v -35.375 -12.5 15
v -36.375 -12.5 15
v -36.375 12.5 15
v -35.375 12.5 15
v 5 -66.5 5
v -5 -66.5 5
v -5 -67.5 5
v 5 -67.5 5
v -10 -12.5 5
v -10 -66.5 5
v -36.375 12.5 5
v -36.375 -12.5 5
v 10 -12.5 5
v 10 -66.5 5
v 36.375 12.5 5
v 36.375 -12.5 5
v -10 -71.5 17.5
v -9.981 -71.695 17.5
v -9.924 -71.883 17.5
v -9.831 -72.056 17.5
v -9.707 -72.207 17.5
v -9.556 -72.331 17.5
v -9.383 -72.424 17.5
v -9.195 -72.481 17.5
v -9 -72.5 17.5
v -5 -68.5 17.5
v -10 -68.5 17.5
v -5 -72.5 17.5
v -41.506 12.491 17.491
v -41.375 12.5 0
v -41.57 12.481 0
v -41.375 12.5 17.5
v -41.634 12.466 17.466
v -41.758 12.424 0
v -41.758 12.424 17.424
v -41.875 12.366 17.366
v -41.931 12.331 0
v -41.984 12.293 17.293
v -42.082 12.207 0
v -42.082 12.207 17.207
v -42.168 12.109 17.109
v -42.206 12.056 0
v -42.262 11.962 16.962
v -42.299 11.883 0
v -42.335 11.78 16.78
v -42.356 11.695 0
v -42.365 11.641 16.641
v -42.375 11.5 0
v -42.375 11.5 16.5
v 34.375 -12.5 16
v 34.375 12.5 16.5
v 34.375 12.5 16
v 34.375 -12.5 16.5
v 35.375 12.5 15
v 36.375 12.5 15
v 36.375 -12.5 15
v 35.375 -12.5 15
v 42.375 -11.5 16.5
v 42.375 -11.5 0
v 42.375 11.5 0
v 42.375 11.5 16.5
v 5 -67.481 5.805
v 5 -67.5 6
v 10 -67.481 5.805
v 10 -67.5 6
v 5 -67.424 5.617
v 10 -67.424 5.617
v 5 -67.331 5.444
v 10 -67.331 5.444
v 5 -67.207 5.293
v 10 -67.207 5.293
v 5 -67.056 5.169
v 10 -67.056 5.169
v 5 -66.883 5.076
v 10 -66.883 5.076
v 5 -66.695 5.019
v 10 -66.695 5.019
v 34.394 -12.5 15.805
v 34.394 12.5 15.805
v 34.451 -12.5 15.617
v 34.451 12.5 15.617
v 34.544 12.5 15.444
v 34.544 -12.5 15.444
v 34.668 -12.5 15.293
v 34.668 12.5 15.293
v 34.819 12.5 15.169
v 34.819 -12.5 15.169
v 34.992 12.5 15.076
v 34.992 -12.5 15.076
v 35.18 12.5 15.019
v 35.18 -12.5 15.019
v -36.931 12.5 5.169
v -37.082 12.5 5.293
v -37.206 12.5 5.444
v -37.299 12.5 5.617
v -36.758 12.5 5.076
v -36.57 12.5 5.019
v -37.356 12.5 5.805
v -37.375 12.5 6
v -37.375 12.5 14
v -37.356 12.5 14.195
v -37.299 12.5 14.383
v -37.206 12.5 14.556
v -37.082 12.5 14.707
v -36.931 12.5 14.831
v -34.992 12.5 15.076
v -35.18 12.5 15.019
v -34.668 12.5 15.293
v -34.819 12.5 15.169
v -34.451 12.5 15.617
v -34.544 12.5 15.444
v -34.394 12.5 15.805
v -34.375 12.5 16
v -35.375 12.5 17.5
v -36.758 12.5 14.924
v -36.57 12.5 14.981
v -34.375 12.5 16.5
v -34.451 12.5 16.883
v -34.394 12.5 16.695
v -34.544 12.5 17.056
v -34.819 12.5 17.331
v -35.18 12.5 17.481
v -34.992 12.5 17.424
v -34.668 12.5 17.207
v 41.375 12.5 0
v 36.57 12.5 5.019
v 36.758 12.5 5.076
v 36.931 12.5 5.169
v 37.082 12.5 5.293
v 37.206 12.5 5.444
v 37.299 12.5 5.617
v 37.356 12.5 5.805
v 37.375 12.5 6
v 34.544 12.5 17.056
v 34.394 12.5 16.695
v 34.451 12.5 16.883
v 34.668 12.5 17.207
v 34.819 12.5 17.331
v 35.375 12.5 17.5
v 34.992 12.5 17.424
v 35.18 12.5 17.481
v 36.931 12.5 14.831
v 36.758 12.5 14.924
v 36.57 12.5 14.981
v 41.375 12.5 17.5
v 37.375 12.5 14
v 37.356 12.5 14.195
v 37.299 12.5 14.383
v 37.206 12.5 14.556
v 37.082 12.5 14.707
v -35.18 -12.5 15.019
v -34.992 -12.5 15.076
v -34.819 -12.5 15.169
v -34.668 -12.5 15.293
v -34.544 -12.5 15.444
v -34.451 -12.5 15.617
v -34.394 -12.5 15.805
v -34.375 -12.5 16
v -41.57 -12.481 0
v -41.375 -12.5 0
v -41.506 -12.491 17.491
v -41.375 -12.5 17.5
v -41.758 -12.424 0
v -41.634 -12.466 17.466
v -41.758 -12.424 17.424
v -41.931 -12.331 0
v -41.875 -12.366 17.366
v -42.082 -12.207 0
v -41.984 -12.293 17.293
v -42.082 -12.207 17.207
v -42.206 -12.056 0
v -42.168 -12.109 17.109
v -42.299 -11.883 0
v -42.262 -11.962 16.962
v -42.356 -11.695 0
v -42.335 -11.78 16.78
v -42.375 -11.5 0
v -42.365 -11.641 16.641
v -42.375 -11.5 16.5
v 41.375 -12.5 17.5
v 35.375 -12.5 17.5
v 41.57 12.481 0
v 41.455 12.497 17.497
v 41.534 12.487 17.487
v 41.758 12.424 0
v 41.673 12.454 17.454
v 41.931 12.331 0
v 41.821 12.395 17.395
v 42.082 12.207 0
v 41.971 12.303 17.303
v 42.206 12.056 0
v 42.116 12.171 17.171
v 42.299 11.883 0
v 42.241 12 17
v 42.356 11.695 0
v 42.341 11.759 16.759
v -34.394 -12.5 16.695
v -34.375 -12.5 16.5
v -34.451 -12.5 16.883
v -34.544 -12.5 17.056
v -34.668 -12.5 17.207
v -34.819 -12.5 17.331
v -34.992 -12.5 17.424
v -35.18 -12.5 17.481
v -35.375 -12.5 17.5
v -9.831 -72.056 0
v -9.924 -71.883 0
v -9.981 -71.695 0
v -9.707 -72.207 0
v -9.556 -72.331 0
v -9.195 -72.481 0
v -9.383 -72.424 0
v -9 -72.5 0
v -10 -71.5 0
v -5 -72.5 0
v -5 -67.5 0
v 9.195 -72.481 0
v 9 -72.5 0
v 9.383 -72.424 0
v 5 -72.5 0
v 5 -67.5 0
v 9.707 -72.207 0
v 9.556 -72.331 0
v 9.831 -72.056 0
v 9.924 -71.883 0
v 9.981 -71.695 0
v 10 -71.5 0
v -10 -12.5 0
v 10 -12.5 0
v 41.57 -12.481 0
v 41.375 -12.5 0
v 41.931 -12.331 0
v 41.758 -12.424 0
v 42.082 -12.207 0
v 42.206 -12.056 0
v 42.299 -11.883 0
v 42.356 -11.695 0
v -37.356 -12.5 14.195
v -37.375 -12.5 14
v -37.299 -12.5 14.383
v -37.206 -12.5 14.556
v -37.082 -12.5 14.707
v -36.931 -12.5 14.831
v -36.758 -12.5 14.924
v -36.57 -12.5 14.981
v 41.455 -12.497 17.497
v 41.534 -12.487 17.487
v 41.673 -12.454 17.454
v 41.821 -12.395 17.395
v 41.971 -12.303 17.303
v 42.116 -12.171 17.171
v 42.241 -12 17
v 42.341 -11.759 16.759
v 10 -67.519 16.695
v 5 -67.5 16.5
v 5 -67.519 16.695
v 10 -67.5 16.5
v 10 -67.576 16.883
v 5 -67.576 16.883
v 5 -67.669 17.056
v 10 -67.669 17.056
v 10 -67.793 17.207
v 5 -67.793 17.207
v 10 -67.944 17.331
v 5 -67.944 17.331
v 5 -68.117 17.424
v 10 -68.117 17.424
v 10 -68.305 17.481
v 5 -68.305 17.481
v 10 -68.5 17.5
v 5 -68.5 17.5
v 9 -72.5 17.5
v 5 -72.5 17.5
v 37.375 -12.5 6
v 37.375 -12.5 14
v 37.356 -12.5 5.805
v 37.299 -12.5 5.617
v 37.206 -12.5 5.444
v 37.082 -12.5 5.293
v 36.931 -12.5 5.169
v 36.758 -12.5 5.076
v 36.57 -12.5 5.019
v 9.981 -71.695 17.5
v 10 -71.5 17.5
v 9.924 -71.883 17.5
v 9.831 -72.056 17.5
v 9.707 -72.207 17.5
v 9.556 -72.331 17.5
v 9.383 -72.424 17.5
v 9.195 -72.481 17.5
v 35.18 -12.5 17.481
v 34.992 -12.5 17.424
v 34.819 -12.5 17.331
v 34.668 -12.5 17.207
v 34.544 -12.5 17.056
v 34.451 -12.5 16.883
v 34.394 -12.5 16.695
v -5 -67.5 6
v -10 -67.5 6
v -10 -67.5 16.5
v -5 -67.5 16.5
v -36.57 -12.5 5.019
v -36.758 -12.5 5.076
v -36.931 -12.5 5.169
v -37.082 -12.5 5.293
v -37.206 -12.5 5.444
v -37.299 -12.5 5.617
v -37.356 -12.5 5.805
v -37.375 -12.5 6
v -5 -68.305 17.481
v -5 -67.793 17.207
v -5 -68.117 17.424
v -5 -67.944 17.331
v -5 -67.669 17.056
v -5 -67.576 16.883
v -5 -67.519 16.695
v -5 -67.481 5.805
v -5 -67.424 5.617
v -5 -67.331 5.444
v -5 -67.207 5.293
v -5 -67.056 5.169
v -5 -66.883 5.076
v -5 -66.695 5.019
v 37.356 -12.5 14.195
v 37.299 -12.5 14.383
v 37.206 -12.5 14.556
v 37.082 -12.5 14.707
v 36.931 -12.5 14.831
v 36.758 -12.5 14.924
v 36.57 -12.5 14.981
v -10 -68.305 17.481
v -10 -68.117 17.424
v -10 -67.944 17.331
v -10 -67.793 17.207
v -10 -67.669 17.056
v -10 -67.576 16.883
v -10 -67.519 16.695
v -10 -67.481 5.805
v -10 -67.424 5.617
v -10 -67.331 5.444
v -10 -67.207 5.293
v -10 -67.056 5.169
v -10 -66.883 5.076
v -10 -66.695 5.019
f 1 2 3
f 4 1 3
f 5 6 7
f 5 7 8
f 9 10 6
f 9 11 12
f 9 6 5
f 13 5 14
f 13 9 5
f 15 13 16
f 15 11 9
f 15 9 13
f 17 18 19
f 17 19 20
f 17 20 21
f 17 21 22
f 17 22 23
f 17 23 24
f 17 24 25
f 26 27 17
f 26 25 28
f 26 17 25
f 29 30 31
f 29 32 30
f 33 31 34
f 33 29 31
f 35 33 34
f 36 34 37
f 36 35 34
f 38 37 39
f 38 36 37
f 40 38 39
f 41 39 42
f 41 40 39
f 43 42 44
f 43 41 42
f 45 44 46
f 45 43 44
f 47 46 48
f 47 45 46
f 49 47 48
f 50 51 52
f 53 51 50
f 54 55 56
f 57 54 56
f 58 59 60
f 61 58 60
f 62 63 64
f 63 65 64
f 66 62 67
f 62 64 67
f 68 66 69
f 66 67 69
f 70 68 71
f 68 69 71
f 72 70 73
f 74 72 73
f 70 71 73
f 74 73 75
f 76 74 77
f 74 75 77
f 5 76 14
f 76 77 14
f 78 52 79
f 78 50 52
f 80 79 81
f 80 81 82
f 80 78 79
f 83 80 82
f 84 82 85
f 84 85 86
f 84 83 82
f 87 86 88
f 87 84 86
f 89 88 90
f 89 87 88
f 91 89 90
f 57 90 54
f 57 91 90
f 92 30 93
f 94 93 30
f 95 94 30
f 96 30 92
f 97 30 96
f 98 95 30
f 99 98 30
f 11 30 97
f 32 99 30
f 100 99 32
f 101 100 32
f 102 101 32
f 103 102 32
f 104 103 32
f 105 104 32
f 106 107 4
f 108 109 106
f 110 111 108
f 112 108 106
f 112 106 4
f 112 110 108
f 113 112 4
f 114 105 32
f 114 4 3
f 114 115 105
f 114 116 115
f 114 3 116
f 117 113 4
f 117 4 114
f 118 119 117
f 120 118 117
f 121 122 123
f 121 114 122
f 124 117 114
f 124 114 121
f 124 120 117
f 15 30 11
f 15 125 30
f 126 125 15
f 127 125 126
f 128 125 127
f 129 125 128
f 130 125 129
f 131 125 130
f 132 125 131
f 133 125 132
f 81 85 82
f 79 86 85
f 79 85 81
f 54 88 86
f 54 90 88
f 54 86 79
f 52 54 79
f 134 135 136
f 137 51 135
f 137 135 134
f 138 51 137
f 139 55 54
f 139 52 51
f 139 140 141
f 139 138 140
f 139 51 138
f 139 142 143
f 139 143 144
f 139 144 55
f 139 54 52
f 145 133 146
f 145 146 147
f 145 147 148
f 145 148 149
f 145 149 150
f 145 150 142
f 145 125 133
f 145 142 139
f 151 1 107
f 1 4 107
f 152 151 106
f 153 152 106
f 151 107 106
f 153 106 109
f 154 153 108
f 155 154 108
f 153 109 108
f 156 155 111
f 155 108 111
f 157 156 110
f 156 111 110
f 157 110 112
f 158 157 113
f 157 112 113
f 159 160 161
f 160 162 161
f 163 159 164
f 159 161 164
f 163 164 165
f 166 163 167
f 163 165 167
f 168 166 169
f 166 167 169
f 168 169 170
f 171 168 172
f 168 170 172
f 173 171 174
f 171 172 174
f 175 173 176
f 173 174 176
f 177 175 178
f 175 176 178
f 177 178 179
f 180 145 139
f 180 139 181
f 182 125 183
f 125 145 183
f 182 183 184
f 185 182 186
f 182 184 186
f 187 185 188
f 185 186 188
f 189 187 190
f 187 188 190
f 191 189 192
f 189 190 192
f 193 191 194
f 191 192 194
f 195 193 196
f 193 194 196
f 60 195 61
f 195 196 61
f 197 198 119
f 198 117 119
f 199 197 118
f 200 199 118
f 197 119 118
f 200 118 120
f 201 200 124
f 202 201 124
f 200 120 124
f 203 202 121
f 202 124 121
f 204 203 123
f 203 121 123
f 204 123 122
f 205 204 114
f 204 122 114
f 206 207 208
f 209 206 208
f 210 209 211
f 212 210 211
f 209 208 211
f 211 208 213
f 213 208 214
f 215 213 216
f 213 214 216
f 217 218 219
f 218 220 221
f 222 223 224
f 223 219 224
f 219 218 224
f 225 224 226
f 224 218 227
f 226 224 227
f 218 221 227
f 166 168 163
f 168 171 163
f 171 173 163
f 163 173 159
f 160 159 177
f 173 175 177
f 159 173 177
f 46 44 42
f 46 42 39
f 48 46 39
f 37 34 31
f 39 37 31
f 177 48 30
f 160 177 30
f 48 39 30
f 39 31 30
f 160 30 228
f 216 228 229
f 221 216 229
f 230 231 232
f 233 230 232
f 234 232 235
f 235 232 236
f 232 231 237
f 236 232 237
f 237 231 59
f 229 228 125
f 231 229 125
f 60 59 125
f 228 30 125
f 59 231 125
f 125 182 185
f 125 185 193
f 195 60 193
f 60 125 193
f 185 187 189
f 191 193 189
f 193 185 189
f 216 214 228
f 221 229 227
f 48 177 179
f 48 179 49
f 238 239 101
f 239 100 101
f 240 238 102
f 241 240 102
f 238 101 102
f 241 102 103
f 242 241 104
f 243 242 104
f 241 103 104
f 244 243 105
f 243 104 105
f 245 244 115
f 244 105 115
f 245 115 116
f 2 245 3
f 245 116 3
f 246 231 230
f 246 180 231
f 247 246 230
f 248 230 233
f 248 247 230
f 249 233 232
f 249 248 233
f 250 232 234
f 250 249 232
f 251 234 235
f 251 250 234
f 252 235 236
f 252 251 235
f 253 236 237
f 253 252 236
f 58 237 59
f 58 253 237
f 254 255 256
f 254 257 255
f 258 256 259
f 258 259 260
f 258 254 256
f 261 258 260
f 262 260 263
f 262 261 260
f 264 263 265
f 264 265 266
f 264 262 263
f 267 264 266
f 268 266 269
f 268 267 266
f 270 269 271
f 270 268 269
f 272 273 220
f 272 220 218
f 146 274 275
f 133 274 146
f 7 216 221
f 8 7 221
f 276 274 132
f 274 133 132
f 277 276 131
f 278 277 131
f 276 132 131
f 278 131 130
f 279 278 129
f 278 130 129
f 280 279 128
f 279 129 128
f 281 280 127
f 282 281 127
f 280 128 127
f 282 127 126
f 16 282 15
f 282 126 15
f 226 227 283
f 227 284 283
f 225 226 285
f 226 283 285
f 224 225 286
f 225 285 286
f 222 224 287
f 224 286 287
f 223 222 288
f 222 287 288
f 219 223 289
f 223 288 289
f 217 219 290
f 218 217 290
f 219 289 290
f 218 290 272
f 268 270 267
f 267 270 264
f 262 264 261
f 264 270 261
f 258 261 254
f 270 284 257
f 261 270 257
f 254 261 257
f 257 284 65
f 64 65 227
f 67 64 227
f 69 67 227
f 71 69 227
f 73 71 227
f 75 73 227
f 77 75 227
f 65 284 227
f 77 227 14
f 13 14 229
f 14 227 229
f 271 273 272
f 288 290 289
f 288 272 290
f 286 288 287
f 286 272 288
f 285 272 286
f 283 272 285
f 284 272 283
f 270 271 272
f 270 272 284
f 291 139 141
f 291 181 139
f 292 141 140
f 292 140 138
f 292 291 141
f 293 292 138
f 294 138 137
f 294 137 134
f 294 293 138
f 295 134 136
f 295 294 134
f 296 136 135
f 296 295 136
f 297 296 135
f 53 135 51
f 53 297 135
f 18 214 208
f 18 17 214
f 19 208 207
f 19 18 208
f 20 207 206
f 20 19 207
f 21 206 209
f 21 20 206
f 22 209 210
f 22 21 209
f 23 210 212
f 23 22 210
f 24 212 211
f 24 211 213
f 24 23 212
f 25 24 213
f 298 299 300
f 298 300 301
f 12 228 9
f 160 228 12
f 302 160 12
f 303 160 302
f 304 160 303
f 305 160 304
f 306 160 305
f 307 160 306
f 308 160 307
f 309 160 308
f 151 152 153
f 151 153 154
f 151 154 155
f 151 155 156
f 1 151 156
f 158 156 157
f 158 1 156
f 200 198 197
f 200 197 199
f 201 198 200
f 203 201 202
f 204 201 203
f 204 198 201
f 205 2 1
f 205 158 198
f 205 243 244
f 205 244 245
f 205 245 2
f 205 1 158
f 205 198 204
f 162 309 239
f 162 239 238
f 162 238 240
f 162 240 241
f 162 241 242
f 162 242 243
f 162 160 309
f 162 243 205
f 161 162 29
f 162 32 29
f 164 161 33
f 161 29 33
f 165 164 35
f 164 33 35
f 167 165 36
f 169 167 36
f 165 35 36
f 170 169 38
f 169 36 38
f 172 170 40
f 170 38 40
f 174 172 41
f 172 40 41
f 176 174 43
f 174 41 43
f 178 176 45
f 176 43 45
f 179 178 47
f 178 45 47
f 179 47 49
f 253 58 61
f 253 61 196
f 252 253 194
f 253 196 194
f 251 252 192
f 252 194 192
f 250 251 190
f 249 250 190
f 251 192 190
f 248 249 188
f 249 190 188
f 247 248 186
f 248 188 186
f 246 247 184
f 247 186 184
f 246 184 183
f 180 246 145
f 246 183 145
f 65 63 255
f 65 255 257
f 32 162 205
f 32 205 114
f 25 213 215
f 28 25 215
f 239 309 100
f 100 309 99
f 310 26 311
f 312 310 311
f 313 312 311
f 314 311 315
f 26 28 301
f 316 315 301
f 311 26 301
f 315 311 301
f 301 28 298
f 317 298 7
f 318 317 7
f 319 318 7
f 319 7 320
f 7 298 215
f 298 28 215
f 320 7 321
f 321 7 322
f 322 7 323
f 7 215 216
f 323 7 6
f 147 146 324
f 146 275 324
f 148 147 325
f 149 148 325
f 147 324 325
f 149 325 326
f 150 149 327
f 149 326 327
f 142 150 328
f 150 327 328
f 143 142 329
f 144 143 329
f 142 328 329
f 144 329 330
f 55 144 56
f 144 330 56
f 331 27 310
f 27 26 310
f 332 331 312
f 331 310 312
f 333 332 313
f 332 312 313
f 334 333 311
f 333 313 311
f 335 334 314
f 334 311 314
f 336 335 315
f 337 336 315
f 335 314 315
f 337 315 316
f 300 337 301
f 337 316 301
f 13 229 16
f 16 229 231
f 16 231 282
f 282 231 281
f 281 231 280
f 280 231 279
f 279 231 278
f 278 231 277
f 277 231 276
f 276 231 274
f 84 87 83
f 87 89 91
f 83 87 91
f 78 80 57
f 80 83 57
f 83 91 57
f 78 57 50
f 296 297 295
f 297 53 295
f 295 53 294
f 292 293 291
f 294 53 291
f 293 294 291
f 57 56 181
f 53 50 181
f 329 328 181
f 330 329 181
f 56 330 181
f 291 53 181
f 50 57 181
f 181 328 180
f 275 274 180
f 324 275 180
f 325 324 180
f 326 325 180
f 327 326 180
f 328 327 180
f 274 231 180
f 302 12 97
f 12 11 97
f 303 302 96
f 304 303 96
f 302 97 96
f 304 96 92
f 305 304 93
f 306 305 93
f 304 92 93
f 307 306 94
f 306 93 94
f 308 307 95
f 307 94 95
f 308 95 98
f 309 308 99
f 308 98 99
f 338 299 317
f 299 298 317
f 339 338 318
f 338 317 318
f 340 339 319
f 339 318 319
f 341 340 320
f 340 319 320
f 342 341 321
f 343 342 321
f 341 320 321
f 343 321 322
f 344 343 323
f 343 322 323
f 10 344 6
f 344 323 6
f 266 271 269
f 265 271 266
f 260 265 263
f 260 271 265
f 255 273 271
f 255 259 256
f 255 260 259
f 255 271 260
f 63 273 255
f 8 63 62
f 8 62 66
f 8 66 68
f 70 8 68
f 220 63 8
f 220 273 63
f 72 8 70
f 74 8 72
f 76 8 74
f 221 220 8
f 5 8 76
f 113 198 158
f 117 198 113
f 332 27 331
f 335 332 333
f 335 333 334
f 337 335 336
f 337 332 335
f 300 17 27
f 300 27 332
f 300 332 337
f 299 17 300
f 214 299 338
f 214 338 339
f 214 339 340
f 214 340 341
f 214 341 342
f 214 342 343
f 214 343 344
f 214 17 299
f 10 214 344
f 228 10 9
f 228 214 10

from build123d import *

# Parameters (mm, degrees)
F0_W     = 27.375
F0_H     = 25
F0_W_2   = 20
F0_H_2   = 55
F1_DEPTH = 5
F2_W     = 5
F2_H     = 25
F2_H_2   = 5
F3_DEPTH = 17.5
F4_W     = 25
F4_H     = 2.5
F5_DEPTH = 3
F6_W     = 25
F6_H     = 2.5
F7_DEPTH = 3
F8_R     = 1


with BuildPart() as f1:
    # F0 (on Top) → F1 (new body)
    with BuildSketch(Plane.XY):
        with Locations((-23.6875, 0)):
            Rectangle(F0_W, F0_H)
        Rectangle(F0_W_2, F0_H)
        with Locations((23.6875, 0)):
            Rectangle(F0_W, F0_H)
        with Locations((0, -40)):
            Rectangle(F0_W_2, F0_H_2)
    extrude(amount=F1_DEPTH)

    # F2 (on Top) → F3 (join)
    with BuildSketch(Plane.XY):
        with Locations((-39.875, 0)):
            Rectangle(F2_W, F2_H)
        with Locations((39.875, 0)):
            Rectangle(F2_W, F2_H)
        with Locations((-7.5, -70)):
            Rectangle(F2_W, F2_H_2)
        with Locations((7.5, -70)):
            Rectangle(F2_W, F2_H_2)
    extrude(amount=F3_DEPTH)

    # F4 (on face) → F5 (join)
    with BuildSketch(Plane.YZ.offset(-37.375)):
        with Locations((0, 16.25)):
            Rectangle(F4_W, F4_H)
    extrude(amount=F5_DEPTH)

    # F6 (on face) → F7 (join)
    with BuildSketch(Plane(origin=(37.375, 0, 0), x_dir=(0, -1, 0), z_dir=(-1, 0, 0))):
        with Locations((0, 16.25)):
            Rectangle(F6_W, F6_H)
    extrude(amount=F7_DEPTH)

    # F8
    f8_edges = [f1.edges().sort_by_distance(p)[0] for p in [
        (-37.375, 0, 5),
        (37.375, 0, 5),
        (7.5, -67.5, 17.5),
        (-7.5, -67.5, 17.5),
        (7.5, -67.5, 5),
        (-7.5, -67.5, 5),
        (-42.375, -12.5, 8.75),
        (-42.375, 12.5, 8.75),
        (-42.375, 0, 17.5),
        (42.375, 0, 17.5),
        (42.375, -12.5, 8.75),
        (42.375, 12.5, 8.75),
        (-10, -72.5, 8.75),
        (10, -72.5, 8.75),
        (-34.375, 0, 17.5),
        (-34.375, 0, 15),
        (34.375, 0, 17.5),
        (34.375, 0, 15),
        (37.375, 0, 15),
        (-37.375, 0, 15),
    ]]
    fillet(f8_edges, radius=F8_R)


solid = f1.part
